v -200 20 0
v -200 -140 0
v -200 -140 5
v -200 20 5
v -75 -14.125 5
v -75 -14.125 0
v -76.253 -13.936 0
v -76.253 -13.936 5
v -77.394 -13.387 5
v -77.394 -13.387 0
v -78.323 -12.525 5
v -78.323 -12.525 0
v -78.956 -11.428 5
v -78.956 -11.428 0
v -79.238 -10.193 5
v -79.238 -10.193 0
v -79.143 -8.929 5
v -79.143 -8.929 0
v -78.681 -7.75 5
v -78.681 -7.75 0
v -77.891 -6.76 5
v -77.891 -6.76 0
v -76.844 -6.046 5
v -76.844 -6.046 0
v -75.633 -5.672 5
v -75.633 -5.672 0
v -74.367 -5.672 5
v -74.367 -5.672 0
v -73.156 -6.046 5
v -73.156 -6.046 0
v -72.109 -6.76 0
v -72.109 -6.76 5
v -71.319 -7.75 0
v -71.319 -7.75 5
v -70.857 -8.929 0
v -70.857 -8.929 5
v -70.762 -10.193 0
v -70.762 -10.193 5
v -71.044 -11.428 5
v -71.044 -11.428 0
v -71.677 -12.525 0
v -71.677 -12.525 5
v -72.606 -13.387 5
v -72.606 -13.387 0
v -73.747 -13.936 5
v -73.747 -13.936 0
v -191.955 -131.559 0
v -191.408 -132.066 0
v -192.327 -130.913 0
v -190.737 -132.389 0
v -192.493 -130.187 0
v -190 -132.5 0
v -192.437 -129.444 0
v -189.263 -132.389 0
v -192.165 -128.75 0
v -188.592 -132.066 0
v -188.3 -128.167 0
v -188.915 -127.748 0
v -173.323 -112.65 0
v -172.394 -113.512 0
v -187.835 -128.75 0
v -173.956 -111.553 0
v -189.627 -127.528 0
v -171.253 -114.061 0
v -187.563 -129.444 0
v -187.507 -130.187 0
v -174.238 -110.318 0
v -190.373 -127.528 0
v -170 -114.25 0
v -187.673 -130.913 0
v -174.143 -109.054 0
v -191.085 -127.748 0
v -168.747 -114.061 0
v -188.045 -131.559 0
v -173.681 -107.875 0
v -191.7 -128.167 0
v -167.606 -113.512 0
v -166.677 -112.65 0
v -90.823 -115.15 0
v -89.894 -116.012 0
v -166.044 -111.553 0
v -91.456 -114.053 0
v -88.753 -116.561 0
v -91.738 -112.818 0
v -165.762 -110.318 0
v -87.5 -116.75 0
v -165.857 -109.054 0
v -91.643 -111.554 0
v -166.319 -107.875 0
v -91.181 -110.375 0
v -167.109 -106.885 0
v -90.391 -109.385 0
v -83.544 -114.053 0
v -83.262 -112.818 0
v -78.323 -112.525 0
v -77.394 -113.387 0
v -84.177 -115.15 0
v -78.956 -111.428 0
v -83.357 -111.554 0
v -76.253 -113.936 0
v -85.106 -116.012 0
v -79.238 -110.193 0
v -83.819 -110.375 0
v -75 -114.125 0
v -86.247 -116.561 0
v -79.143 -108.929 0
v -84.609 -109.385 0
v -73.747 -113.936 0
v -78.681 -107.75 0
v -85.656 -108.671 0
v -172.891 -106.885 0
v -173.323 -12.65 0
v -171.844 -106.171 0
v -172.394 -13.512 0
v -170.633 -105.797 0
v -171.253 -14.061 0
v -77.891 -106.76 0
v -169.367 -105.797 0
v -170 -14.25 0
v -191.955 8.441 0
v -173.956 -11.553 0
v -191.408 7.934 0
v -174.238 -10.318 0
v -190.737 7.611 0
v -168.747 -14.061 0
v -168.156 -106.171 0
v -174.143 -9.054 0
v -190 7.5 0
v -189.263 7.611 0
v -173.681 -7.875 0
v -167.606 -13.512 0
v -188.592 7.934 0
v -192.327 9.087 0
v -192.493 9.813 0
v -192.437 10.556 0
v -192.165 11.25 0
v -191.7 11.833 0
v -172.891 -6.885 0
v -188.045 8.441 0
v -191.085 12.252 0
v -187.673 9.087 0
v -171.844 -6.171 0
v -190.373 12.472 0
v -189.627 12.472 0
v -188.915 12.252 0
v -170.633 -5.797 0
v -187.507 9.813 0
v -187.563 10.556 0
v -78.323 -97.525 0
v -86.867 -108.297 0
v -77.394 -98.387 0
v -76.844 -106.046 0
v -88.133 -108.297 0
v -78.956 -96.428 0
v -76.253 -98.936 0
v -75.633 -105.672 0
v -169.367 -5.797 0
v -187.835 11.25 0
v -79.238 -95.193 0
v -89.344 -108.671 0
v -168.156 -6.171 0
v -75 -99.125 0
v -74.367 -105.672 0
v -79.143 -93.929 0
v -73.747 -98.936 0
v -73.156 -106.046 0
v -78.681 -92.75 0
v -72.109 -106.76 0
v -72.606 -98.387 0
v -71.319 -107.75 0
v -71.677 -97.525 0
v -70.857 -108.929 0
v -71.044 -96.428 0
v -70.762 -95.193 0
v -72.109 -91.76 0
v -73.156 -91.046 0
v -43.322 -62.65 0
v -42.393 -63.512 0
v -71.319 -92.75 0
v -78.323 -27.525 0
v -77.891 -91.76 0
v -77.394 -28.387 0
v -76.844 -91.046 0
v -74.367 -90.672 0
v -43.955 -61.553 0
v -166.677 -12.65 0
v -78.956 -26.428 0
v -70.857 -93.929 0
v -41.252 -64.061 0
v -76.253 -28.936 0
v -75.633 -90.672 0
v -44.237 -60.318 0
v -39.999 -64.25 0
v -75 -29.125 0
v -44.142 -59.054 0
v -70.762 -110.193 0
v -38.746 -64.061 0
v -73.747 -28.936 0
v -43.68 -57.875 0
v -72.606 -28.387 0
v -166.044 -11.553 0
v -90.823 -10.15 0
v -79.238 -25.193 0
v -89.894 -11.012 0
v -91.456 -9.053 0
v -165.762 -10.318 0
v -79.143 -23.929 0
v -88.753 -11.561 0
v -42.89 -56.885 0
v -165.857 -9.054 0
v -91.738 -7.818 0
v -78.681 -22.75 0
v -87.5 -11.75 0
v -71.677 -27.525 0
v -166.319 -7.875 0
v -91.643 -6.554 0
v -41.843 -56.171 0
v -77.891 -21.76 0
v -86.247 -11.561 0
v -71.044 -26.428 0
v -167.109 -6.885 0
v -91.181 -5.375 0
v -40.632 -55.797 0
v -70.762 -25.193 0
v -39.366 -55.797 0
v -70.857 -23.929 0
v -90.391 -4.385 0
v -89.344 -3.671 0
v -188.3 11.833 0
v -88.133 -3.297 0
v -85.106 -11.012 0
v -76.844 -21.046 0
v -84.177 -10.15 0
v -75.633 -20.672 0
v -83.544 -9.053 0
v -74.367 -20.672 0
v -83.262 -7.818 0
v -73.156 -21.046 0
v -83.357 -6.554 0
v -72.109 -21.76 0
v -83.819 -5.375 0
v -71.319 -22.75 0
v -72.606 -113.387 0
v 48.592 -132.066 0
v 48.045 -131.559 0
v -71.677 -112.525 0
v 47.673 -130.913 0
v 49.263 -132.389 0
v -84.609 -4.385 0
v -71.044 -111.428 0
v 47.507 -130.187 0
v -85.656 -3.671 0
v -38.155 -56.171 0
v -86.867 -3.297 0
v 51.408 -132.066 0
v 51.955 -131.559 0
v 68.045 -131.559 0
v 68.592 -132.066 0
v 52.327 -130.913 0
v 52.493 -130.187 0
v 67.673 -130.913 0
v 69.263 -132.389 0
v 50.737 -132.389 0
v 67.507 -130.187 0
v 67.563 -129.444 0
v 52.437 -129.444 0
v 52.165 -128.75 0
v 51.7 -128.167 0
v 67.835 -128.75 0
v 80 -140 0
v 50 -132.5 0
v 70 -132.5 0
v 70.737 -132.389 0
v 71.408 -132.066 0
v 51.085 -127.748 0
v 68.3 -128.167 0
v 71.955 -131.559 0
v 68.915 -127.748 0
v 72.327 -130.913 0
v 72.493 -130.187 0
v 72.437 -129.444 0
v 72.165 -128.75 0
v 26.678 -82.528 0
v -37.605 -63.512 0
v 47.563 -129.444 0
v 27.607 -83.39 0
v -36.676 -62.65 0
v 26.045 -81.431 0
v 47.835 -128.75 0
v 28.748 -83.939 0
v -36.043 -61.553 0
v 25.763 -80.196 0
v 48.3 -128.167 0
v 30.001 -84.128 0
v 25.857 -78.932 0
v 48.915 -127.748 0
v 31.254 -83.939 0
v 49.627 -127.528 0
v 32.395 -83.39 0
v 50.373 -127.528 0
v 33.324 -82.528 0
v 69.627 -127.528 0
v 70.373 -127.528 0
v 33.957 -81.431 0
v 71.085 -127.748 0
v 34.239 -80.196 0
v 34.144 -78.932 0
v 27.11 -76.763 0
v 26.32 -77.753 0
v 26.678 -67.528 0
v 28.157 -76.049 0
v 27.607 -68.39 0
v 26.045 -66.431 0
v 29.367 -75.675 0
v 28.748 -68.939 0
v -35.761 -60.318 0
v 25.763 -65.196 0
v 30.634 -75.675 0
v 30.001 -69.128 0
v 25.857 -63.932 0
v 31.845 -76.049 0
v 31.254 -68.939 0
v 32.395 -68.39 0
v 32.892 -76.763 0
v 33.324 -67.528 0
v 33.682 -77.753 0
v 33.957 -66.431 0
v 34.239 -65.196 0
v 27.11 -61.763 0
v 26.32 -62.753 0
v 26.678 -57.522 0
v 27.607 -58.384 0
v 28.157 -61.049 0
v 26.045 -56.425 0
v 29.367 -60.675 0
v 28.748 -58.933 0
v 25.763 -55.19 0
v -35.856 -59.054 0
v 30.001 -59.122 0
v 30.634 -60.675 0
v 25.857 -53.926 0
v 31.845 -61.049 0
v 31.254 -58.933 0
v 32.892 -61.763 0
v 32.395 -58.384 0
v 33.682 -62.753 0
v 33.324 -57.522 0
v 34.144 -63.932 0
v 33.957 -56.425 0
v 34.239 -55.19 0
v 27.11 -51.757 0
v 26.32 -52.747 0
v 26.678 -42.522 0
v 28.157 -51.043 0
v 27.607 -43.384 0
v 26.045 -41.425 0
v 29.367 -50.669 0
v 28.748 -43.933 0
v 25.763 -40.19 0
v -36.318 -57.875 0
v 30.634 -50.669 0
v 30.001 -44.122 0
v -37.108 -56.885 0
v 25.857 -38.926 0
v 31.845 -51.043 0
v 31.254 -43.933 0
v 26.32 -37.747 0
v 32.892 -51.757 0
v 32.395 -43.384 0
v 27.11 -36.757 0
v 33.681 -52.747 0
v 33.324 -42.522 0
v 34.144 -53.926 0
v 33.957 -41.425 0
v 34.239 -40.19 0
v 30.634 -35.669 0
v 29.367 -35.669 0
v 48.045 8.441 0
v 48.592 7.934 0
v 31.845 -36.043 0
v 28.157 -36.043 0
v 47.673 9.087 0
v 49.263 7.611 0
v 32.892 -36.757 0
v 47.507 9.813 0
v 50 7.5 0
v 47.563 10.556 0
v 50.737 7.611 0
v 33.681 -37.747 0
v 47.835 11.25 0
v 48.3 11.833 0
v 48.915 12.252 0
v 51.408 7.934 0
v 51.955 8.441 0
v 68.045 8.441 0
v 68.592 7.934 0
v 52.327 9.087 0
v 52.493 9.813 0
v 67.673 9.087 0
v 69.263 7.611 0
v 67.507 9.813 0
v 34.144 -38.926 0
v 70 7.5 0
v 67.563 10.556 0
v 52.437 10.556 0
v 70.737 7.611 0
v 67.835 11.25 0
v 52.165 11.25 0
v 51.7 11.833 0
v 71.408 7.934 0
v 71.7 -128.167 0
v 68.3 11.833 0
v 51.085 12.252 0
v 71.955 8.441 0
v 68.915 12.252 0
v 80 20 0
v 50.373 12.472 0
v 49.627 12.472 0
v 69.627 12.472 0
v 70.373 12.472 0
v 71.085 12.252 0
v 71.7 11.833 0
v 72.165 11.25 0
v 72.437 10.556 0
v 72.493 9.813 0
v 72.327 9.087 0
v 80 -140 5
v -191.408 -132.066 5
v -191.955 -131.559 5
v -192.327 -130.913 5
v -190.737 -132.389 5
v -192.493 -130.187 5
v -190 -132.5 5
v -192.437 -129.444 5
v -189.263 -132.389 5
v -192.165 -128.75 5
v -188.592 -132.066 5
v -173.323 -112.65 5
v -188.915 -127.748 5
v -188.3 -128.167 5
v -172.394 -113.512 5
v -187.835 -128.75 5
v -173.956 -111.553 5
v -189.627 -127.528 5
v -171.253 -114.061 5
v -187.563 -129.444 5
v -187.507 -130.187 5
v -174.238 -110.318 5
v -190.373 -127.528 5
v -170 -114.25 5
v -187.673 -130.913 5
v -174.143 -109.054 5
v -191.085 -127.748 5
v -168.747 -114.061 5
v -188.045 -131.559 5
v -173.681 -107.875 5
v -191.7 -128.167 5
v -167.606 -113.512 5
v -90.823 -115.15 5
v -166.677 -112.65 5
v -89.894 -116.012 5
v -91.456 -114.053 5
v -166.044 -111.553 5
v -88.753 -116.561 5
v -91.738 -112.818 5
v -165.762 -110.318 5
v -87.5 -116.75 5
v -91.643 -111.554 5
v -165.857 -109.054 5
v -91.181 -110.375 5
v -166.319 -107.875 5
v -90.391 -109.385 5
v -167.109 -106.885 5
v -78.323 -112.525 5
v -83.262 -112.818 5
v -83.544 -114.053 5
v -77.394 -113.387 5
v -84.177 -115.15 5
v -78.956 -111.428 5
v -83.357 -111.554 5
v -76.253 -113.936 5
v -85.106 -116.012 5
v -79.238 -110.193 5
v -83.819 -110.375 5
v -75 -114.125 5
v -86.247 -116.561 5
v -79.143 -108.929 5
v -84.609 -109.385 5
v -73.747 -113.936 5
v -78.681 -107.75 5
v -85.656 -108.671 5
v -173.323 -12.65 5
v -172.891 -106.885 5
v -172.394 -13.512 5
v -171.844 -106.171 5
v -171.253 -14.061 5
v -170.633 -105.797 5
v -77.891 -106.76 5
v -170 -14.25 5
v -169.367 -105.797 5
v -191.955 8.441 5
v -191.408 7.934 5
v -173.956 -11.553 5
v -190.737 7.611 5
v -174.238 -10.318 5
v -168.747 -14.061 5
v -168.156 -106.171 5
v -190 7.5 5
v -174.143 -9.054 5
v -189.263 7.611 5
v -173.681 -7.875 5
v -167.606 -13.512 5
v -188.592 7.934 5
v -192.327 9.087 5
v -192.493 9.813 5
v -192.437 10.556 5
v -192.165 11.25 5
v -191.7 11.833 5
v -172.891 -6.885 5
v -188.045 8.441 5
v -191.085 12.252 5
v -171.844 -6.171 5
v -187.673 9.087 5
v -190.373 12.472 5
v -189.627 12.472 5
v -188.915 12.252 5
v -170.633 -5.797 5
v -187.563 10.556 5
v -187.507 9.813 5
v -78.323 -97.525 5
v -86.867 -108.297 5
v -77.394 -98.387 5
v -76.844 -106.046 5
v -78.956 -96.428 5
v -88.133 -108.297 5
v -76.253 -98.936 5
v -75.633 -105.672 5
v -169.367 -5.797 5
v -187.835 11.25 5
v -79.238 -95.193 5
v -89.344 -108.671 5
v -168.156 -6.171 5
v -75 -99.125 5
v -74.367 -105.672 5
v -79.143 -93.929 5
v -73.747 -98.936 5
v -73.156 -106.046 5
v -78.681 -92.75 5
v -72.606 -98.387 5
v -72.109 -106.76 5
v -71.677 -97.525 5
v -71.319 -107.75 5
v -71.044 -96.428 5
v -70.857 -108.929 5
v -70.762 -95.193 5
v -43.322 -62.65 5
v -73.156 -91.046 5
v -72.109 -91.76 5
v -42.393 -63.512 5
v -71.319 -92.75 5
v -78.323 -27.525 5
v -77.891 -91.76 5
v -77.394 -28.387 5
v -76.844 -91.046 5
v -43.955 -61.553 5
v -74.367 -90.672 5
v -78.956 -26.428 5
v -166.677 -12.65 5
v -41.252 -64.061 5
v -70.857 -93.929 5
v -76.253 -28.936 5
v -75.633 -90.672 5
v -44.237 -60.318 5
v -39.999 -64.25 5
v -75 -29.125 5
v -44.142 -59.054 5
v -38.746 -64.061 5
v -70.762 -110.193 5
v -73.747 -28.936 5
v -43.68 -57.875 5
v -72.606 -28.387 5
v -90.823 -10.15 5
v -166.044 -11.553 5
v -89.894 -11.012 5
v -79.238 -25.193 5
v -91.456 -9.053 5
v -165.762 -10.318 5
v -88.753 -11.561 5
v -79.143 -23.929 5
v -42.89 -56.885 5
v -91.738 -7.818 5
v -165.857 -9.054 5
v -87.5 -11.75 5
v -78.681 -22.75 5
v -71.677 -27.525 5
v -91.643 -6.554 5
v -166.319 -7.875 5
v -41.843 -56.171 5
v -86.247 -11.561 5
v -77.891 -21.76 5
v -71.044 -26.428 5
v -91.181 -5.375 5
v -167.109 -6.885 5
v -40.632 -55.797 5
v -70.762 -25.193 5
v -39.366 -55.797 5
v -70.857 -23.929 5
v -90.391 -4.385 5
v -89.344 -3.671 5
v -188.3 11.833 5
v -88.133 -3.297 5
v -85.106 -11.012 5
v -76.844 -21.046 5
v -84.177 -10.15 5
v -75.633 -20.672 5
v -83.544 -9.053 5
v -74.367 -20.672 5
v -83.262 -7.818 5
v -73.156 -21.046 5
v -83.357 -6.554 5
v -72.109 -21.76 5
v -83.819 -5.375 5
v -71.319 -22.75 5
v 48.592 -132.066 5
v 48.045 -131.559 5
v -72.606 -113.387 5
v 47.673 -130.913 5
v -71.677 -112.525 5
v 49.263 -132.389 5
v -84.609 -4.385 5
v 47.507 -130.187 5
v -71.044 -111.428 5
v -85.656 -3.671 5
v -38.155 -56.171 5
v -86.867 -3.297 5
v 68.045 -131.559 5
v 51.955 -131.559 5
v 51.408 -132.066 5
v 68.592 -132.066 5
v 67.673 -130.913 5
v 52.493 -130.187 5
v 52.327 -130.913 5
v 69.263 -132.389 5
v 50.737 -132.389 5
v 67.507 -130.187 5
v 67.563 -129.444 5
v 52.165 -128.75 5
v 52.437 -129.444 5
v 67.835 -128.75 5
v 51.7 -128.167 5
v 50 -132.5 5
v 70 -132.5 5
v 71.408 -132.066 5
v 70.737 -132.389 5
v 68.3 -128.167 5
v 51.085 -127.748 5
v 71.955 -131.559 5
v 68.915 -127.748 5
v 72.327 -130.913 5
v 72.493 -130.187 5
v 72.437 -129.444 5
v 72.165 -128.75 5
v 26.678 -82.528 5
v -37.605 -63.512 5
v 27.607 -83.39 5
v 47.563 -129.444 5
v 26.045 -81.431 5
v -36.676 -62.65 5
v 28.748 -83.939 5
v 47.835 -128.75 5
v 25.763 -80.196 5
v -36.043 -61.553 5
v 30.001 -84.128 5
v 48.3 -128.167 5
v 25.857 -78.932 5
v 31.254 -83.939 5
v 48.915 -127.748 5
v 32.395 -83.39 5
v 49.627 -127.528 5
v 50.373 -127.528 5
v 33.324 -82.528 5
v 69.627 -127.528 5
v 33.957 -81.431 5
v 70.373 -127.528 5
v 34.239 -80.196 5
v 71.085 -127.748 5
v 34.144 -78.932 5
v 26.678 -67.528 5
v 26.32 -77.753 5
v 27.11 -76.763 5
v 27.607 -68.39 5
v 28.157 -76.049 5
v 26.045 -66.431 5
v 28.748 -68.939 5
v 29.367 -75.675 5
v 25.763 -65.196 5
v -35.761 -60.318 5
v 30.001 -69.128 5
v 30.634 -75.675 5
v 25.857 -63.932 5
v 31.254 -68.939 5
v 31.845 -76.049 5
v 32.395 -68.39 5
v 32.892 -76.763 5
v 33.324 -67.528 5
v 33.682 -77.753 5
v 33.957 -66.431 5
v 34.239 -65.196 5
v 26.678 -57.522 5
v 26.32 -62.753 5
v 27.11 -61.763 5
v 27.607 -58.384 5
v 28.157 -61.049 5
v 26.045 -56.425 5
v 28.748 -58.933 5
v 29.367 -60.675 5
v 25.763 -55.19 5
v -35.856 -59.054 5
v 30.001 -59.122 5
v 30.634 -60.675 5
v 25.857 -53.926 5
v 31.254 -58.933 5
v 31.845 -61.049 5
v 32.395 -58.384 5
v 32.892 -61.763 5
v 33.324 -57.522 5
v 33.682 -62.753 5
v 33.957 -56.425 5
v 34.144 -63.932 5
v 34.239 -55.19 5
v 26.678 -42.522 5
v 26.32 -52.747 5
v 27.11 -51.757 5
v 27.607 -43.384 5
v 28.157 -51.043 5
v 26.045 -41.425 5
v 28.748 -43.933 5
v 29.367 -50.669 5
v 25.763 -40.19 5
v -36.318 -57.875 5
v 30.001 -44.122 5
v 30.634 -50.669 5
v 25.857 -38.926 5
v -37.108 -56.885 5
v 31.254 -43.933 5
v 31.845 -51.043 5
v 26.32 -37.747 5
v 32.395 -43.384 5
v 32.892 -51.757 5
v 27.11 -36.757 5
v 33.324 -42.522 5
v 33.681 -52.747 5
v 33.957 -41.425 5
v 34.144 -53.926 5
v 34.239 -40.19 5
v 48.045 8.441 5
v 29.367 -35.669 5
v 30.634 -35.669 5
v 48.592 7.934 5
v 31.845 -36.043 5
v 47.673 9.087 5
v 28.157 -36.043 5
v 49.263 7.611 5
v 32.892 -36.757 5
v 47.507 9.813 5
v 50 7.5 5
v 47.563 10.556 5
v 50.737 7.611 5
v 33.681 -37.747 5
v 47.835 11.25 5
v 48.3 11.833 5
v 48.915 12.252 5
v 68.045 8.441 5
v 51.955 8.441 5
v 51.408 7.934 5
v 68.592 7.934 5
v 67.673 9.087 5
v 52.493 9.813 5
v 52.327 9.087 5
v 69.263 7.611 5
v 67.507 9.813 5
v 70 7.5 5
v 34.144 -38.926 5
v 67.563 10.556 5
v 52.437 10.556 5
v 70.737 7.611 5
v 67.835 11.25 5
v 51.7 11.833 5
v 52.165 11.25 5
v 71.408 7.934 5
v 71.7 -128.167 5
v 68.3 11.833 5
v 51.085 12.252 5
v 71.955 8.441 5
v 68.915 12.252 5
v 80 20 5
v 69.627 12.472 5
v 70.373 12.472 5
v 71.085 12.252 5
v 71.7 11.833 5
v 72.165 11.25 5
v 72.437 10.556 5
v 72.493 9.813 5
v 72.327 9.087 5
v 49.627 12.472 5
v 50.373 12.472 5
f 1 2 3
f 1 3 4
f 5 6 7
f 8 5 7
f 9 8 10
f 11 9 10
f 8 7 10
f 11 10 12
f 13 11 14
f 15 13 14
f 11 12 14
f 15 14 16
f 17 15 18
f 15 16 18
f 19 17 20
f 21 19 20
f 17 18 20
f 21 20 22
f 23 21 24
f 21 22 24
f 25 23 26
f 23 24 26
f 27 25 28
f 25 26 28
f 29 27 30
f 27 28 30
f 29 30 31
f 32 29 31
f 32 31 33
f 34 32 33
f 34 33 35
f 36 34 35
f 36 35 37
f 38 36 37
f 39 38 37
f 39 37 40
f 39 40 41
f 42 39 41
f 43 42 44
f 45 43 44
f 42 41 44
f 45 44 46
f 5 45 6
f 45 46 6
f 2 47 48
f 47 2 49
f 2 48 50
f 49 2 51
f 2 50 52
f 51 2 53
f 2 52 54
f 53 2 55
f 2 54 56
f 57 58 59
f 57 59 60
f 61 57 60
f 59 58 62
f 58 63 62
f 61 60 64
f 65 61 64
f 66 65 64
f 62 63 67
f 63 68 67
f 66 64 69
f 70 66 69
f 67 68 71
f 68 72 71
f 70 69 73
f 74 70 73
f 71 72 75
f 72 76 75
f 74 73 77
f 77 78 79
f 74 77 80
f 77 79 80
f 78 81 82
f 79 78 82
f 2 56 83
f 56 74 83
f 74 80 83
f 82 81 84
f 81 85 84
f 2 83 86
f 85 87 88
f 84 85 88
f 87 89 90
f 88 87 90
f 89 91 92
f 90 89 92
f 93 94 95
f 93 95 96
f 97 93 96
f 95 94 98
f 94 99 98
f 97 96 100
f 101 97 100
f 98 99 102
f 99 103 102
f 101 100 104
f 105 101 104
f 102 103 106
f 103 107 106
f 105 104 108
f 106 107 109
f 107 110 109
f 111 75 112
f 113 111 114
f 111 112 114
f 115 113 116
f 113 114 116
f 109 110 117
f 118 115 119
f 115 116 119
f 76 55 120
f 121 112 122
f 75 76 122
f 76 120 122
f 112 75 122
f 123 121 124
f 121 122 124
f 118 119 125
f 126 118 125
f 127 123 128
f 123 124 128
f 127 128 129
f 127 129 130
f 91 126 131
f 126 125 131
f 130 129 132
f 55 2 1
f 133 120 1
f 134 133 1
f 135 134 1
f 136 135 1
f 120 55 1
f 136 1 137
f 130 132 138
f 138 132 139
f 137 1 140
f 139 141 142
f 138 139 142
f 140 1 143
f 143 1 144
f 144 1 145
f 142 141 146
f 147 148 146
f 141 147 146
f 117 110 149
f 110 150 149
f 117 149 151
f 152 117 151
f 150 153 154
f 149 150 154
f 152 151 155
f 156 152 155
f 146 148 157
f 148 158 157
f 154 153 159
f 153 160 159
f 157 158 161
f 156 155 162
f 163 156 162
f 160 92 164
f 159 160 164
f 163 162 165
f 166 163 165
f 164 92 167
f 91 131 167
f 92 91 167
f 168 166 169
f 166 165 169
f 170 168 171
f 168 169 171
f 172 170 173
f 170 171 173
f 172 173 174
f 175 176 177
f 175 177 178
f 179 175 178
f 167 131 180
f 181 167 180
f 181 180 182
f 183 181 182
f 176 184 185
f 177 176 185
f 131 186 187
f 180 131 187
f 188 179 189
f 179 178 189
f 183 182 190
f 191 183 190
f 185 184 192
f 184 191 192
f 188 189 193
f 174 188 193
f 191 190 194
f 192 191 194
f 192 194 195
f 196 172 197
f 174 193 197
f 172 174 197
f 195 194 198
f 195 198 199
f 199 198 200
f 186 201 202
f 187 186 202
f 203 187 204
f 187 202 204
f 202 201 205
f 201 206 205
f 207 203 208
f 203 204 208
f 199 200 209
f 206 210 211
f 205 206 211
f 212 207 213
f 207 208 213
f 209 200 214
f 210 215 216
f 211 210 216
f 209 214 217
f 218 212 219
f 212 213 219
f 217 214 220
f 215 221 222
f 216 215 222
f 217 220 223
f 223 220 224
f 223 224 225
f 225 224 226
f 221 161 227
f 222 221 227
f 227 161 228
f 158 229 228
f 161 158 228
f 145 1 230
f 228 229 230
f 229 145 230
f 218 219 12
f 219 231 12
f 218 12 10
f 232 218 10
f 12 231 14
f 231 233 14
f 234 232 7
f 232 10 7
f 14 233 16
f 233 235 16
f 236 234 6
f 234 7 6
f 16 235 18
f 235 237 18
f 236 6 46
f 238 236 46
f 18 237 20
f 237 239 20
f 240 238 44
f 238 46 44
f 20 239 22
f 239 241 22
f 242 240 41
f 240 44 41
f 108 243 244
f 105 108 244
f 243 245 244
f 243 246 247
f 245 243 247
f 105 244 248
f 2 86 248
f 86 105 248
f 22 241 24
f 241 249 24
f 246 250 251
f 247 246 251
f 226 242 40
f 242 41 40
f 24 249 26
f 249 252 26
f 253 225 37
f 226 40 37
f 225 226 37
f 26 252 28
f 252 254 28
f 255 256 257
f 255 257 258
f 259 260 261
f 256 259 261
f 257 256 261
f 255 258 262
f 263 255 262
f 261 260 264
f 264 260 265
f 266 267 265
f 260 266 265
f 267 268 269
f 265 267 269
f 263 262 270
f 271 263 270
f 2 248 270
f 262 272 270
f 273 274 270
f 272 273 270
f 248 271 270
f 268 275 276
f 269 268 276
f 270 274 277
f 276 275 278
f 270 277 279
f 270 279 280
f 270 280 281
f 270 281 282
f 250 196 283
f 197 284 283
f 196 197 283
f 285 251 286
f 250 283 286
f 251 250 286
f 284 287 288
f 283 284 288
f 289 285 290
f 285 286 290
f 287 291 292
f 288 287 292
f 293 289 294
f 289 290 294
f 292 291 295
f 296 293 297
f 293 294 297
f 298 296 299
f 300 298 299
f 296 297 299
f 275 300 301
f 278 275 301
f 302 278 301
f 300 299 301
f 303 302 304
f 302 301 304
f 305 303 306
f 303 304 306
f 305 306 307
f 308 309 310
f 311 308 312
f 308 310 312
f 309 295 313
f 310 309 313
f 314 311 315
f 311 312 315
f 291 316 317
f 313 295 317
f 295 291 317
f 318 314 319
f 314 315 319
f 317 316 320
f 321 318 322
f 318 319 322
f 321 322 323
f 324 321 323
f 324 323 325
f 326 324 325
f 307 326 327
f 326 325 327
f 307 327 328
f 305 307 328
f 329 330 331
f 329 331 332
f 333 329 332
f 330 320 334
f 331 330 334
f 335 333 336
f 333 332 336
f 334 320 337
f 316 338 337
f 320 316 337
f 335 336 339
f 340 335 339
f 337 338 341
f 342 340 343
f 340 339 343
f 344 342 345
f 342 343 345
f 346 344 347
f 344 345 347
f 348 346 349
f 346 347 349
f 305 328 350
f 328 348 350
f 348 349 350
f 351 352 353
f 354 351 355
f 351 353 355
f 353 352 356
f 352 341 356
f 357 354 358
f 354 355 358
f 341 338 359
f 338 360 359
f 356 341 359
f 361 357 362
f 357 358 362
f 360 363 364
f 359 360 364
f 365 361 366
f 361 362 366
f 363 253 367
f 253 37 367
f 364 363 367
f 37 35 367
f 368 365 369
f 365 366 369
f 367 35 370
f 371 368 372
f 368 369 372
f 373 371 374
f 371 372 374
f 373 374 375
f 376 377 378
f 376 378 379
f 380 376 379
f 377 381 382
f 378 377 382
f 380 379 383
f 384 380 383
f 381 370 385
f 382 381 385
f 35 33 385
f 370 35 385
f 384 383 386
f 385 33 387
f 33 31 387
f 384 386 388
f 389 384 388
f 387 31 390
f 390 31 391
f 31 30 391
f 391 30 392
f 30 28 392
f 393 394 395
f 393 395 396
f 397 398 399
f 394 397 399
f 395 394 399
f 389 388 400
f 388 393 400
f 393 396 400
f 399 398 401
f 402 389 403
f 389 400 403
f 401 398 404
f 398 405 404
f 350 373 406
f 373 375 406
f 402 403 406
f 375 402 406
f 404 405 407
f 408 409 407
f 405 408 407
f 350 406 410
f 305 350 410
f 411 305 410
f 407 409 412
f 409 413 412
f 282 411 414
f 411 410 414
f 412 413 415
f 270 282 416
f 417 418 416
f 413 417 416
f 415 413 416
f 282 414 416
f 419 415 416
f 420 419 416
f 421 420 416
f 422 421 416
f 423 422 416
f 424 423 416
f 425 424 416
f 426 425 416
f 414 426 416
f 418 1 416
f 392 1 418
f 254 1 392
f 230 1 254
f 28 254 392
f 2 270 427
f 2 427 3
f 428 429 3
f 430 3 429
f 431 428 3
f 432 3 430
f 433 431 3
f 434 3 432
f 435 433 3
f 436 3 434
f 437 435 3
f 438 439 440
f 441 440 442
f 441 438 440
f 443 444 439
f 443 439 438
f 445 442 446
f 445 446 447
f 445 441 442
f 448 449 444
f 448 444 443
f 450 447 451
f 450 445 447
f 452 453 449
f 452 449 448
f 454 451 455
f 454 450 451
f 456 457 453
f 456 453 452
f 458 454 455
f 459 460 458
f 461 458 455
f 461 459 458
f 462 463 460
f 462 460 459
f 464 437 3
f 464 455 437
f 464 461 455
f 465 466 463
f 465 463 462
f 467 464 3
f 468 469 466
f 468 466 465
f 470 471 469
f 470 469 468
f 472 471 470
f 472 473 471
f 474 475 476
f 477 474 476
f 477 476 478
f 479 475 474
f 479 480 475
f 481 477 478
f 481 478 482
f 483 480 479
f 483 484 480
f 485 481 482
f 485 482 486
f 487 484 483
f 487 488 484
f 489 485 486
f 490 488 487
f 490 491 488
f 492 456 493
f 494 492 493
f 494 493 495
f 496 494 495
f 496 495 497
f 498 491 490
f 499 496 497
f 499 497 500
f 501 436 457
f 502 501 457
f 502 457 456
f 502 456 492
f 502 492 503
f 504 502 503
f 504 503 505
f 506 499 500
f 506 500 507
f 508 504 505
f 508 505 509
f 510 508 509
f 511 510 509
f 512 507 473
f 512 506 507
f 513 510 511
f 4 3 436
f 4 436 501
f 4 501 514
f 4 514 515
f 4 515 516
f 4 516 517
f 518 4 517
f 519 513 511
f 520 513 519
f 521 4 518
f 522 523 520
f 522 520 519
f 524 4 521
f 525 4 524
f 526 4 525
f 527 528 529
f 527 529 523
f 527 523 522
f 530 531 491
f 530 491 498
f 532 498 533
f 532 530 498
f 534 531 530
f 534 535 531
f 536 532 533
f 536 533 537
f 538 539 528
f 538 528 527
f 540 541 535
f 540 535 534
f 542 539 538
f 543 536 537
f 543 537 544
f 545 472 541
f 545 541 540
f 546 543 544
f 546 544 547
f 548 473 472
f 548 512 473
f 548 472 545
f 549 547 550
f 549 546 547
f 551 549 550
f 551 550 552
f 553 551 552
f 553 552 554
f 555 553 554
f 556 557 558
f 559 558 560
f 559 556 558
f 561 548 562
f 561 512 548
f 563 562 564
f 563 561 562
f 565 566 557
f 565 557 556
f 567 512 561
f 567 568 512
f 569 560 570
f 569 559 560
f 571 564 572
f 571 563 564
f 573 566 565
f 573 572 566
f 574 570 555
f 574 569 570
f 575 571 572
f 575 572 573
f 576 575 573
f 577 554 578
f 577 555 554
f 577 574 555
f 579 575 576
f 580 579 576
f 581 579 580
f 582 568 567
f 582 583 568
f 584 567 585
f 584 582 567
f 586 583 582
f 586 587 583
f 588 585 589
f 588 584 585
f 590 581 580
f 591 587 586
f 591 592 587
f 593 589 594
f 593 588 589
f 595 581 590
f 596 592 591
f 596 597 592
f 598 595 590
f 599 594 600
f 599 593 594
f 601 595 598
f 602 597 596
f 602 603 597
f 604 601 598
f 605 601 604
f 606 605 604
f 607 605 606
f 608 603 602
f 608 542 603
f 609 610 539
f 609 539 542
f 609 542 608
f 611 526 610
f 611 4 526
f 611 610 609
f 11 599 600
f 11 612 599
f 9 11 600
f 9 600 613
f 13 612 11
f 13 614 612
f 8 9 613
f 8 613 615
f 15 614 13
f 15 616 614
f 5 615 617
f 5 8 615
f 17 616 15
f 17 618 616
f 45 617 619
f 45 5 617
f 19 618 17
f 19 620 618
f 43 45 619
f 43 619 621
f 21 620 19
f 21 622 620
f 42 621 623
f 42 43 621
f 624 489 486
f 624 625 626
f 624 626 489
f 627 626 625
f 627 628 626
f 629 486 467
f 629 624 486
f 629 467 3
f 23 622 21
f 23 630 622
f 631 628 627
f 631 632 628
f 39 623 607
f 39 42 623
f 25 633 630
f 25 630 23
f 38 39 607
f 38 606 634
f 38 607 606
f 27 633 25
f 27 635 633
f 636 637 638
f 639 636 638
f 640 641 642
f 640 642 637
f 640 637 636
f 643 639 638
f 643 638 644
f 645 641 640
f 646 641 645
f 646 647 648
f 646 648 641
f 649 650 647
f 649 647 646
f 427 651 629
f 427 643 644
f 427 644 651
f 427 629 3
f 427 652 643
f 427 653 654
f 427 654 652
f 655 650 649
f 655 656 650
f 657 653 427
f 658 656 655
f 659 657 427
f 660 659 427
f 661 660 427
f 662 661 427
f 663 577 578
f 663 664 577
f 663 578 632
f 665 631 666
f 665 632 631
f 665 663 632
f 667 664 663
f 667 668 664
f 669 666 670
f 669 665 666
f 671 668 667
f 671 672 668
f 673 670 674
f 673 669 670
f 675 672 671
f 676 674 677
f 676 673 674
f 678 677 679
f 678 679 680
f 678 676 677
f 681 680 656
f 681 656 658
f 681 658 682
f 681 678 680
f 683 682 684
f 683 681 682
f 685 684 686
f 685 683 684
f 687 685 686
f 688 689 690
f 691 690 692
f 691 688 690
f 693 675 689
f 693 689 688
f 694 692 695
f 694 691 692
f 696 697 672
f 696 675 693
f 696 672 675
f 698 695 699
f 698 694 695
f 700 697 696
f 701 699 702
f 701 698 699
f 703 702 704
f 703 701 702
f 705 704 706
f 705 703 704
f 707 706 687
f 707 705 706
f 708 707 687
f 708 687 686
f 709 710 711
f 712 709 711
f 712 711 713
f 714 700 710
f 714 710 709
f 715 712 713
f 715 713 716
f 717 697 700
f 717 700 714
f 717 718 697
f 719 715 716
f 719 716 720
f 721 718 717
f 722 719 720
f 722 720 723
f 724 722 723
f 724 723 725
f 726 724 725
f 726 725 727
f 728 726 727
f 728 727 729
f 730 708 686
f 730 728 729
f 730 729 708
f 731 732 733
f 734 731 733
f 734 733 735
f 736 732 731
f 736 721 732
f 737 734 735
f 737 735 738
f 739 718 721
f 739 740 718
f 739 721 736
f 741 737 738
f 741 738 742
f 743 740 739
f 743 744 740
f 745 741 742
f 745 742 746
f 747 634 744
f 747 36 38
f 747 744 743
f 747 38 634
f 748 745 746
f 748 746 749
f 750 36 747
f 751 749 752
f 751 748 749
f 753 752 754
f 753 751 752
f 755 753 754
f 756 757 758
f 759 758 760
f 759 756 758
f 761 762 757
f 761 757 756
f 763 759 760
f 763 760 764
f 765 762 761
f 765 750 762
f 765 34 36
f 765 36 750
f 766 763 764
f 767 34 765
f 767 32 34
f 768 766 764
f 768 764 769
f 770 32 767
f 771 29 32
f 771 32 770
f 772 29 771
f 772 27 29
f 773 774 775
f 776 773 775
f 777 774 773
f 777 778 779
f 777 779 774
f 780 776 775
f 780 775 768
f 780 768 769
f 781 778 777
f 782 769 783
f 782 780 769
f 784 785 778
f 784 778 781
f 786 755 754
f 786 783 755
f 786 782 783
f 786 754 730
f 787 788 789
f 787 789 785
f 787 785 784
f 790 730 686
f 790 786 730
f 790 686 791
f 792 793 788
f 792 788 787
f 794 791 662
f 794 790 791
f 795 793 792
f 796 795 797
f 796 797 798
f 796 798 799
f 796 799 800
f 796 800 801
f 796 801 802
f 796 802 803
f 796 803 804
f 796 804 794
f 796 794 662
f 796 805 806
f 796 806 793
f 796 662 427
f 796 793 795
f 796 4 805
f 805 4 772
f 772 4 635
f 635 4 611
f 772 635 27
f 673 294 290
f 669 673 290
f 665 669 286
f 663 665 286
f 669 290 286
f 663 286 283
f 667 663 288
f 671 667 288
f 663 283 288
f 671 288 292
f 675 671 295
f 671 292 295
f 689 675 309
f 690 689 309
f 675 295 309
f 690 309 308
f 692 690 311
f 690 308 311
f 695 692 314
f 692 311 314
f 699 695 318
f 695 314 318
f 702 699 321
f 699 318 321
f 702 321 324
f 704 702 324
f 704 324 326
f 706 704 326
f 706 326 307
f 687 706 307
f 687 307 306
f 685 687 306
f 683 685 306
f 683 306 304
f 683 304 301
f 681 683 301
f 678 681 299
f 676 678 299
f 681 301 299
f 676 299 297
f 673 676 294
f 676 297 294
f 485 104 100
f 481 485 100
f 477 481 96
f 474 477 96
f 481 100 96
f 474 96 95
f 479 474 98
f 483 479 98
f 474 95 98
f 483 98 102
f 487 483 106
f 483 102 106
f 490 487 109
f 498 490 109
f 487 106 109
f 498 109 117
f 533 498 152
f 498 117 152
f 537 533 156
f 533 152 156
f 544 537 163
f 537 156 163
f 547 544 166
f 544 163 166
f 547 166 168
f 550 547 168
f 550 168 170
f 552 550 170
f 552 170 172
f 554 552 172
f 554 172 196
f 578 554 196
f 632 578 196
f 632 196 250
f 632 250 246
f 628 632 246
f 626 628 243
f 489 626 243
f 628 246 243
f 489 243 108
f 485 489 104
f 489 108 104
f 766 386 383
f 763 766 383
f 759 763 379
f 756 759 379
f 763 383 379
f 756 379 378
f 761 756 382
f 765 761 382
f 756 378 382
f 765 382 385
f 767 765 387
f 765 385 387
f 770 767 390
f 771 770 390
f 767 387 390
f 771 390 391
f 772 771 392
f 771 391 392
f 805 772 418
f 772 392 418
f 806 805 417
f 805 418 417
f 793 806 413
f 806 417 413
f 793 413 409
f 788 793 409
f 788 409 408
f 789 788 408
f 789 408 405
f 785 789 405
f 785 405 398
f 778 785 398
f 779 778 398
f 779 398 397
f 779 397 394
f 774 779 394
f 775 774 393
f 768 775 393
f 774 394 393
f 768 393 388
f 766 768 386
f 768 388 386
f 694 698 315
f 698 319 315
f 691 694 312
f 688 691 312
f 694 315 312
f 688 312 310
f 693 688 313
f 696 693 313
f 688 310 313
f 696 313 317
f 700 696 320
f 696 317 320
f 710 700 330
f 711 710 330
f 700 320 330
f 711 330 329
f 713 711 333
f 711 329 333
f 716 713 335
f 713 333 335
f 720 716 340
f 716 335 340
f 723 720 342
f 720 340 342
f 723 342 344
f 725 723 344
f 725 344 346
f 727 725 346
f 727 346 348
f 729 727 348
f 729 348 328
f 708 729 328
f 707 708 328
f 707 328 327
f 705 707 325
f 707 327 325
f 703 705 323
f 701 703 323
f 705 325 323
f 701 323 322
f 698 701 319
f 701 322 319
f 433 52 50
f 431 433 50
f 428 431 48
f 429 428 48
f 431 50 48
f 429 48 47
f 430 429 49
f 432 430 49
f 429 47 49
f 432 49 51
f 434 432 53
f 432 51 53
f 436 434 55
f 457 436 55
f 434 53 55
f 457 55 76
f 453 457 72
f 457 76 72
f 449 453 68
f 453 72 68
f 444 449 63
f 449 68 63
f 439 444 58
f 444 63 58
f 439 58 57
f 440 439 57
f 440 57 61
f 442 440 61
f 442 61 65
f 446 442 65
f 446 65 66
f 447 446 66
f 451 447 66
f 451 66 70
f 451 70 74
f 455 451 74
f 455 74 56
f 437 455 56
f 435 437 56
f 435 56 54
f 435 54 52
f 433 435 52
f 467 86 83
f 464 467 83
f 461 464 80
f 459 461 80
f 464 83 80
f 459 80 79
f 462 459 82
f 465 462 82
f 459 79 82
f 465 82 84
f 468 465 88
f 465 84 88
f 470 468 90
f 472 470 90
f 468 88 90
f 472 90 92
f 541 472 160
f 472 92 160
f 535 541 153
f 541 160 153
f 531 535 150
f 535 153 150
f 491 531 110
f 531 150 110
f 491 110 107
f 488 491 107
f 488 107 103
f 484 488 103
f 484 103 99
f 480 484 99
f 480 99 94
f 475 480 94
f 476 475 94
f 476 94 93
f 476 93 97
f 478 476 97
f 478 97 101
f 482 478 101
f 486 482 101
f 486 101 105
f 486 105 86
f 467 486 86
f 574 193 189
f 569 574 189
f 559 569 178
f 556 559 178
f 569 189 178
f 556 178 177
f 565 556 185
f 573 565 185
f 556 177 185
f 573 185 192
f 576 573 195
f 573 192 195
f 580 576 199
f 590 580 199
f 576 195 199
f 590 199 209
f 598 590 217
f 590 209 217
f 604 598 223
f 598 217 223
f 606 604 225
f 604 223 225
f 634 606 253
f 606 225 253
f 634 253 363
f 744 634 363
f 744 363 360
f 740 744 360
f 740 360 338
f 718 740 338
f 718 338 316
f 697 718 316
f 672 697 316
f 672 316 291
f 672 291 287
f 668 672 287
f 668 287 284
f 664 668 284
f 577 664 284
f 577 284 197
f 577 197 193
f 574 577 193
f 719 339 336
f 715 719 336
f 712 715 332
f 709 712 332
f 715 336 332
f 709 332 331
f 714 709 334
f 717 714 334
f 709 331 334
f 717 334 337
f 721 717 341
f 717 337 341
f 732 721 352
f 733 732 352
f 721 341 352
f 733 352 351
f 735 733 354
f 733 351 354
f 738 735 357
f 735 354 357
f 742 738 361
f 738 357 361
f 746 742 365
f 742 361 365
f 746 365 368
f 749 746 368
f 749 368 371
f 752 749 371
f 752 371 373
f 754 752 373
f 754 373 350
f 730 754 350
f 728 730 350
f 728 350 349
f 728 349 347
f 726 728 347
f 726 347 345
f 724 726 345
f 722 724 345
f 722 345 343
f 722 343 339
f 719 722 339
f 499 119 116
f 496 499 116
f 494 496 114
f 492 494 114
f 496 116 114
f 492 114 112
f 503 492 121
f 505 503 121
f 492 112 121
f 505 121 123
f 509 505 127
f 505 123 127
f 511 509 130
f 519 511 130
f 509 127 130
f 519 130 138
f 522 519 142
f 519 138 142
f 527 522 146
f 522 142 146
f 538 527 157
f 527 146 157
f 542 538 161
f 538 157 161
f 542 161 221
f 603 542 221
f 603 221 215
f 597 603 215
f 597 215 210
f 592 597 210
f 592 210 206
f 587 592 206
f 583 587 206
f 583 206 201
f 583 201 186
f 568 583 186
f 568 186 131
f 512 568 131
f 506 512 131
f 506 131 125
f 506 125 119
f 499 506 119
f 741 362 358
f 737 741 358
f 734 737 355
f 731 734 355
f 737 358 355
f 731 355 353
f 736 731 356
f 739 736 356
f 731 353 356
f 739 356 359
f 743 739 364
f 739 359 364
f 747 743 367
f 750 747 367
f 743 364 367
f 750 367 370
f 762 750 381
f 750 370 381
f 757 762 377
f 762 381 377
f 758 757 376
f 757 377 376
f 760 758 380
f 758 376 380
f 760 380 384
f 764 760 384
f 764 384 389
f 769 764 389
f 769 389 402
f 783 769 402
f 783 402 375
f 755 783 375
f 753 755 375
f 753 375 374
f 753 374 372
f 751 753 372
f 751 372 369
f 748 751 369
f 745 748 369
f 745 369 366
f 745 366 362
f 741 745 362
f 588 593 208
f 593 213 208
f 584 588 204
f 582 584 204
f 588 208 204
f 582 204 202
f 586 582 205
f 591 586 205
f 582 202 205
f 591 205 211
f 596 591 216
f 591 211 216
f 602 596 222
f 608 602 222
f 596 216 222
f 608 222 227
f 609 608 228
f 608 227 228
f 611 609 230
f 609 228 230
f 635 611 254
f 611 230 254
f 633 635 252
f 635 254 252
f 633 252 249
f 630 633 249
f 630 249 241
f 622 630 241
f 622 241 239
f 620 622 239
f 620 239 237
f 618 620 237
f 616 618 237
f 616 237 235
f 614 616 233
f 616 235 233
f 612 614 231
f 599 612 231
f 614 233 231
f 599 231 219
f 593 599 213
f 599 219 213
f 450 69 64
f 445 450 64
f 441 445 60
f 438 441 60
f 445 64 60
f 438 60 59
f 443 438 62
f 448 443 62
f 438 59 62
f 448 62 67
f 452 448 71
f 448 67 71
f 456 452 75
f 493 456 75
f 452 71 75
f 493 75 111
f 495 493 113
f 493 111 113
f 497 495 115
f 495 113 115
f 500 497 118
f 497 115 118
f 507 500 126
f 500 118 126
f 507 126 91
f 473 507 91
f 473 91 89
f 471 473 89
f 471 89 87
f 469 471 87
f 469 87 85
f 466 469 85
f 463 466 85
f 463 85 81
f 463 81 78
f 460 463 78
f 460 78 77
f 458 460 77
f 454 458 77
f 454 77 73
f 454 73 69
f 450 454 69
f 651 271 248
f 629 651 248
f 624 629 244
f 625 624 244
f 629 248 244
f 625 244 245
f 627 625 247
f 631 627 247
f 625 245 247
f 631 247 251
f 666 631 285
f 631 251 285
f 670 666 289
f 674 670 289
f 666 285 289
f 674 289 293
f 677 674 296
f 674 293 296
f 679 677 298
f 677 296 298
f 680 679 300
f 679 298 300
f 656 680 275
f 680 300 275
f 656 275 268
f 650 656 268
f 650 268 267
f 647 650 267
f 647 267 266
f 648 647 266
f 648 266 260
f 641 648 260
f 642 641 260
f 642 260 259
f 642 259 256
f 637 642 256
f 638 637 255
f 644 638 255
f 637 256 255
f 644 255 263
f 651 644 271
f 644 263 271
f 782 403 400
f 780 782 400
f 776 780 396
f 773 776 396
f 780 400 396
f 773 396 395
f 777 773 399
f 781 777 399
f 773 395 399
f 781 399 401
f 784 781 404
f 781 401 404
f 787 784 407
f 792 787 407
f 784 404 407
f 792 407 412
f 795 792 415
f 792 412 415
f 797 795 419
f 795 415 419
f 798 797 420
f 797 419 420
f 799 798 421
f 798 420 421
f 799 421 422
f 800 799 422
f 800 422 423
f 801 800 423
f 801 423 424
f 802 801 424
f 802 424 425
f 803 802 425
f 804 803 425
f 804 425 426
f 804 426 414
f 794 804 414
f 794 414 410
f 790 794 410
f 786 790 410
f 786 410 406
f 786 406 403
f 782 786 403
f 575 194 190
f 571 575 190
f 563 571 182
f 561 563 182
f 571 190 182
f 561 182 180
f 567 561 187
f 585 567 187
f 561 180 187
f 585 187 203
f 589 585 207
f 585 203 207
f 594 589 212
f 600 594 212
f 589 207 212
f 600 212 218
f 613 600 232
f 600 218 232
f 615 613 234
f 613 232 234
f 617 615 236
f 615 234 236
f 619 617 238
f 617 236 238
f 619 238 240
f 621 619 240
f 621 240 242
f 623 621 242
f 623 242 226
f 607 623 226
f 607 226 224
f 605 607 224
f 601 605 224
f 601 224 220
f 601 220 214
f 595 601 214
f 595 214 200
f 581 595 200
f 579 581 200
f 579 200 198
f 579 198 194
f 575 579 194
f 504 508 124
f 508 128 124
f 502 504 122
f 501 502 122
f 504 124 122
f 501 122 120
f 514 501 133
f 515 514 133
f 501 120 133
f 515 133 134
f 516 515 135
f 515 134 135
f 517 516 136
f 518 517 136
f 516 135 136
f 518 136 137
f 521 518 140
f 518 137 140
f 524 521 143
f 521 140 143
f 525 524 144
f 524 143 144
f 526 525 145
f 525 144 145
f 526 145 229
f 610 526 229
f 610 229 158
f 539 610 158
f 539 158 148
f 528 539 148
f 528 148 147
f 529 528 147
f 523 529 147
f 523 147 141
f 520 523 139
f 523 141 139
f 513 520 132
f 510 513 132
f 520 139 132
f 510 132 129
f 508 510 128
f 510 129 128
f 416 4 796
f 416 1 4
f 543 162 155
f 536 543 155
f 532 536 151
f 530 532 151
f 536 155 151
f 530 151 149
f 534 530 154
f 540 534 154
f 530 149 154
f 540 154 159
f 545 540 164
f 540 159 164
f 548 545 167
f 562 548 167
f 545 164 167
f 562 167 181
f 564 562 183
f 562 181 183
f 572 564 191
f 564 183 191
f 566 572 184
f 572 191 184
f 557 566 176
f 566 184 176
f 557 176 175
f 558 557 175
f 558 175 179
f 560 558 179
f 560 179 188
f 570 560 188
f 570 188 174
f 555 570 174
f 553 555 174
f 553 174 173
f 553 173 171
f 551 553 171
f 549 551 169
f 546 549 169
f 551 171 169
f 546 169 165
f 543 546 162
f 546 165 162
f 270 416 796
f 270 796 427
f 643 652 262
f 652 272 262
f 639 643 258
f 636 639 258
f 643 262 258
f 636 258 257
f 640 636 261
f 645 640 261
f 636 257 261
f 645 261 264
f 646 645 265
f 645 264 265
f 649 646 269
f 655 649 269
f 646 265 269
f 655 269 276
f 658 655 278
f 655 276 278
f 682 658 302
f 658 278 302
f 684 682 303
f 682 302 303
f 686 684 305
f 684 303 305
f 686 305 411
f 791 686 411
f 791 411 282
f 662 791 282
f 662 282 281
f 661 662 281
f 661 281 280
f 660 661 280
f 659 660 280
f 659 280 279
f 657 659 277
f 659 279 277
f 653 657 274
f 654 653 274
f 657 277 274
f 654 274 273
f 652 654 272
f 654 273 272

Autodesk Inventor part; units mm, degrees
ref_plane "YZ Plane" through (0, 0, 0) normal (1, 0, 0) x (0, 1, 0)
ref_plane "XZ Plane" through (0, 0, 0) normal (0, 1, 0) x (-1, 0, 0)
ref_plane "XY Plane" through (0, 0, 0) normal (0, 0, 1) x (1, 0, 0)
sketch "Sketch1" plane through (0, 0, 0) normal (0, 0, 1) x (1, 0, 0)
  line L0 (-200, 20) -> (80, 20)
  line L1 (80, 20) -> (80, -140)
  line L2 (80, -140) -> (-200, -140)
  line L3 (-200, -140) -> (-200, 20)
  point P0 (0, 0)
  dimension "d0" = 280
  dimension "d1" = 160
  dimension "d2" = 80
  dimension "d3" = 140
extrude "Extrusion1" add sketch "Sketch1" along normal blind 5
sketch "Sketch2" plane through (0, 0, 5) normal (0, 0, 1) x (1, 0, 0)
  circle A0 centre (-170, -10) radius 2.5 projected
  point P0 (0, 0)
  point P1 (-87.5, -7.5)
  point P2 (-170, -10)
  point P3 (-170, -110)
  point P4 (-87.5, -112.5)
  point P5 (-75, -109.875)
  point P6 (-75, -94.875)
  point P7 (-75, -24.875)
  point P8 (-75, -9.875)
  point P9 (-39.999, -60)
  point P10 (30.0009, -79.878)
  point P11 (30.0009, -64.878)
  point P12 (30.0008, -54.872)
  point P13 (30.0008, -39.872)
hole "TornillosGripper" at (-87.5, -7.5, 5) at (-170, -10, 5) at (-170, -110, 5) at (-87.5, -112.5, 5) at (-75, -109.875, 5) at (-75, -94.875, 5) at (-75, -24.875, 5) at (-75, -9.875, 5) at (-39.999, -60, 5) at (30.0009, -79.878, 5) at (30.0009, -64.878, 5) at (30.0008, -54.872, 5) at (30.0008, -39.872, 5) direction (0, 0, -1) diameter 8.5 end through all
sketch "Sketch3" plane through (0, 0, 5) normal (0, 0, 1) x (1, 0, 0)
  line L0 (80, 20) -> (-200, 20) projected
  line L1 (-60, 20) -> (-60, -140) construction
  line L2 (-200, -140) -> (80, -140) projected
  line L3 (-200, 20) -> (-200, -140) projected
  line L4 (-200, -60) -> (80, -60) construction
  line L5 (80, -140) -> (80, 20) projected
  point P0 (0, 0)
  point P1 (-190, 10)
  point P2 (-190, -130)
  point P3 (70, -130)
  point P4 (70, 10)
  point P5 (50, 10)
  point P6 (50, -130)
  dimension "d13" = 10
  dimension "d14" = 10
  dimension "d22" = 20
  dimension "d23" = 10
hole "TornillosBase" at (-190, 10, 5) at (-190, -130, 5) at (70, -130, 5) at (70, 10, 5) at (50, 10, 5) at (50, -130, 5) direction (0, 0, -1) diameter 5 end through all
equation "\"d2\" = 0.5 * d1"
equation "\"d3\" = 0.5 * d0"
properties part number "BaseEnsamble" material "MDF Medium Density Fiberboard"
